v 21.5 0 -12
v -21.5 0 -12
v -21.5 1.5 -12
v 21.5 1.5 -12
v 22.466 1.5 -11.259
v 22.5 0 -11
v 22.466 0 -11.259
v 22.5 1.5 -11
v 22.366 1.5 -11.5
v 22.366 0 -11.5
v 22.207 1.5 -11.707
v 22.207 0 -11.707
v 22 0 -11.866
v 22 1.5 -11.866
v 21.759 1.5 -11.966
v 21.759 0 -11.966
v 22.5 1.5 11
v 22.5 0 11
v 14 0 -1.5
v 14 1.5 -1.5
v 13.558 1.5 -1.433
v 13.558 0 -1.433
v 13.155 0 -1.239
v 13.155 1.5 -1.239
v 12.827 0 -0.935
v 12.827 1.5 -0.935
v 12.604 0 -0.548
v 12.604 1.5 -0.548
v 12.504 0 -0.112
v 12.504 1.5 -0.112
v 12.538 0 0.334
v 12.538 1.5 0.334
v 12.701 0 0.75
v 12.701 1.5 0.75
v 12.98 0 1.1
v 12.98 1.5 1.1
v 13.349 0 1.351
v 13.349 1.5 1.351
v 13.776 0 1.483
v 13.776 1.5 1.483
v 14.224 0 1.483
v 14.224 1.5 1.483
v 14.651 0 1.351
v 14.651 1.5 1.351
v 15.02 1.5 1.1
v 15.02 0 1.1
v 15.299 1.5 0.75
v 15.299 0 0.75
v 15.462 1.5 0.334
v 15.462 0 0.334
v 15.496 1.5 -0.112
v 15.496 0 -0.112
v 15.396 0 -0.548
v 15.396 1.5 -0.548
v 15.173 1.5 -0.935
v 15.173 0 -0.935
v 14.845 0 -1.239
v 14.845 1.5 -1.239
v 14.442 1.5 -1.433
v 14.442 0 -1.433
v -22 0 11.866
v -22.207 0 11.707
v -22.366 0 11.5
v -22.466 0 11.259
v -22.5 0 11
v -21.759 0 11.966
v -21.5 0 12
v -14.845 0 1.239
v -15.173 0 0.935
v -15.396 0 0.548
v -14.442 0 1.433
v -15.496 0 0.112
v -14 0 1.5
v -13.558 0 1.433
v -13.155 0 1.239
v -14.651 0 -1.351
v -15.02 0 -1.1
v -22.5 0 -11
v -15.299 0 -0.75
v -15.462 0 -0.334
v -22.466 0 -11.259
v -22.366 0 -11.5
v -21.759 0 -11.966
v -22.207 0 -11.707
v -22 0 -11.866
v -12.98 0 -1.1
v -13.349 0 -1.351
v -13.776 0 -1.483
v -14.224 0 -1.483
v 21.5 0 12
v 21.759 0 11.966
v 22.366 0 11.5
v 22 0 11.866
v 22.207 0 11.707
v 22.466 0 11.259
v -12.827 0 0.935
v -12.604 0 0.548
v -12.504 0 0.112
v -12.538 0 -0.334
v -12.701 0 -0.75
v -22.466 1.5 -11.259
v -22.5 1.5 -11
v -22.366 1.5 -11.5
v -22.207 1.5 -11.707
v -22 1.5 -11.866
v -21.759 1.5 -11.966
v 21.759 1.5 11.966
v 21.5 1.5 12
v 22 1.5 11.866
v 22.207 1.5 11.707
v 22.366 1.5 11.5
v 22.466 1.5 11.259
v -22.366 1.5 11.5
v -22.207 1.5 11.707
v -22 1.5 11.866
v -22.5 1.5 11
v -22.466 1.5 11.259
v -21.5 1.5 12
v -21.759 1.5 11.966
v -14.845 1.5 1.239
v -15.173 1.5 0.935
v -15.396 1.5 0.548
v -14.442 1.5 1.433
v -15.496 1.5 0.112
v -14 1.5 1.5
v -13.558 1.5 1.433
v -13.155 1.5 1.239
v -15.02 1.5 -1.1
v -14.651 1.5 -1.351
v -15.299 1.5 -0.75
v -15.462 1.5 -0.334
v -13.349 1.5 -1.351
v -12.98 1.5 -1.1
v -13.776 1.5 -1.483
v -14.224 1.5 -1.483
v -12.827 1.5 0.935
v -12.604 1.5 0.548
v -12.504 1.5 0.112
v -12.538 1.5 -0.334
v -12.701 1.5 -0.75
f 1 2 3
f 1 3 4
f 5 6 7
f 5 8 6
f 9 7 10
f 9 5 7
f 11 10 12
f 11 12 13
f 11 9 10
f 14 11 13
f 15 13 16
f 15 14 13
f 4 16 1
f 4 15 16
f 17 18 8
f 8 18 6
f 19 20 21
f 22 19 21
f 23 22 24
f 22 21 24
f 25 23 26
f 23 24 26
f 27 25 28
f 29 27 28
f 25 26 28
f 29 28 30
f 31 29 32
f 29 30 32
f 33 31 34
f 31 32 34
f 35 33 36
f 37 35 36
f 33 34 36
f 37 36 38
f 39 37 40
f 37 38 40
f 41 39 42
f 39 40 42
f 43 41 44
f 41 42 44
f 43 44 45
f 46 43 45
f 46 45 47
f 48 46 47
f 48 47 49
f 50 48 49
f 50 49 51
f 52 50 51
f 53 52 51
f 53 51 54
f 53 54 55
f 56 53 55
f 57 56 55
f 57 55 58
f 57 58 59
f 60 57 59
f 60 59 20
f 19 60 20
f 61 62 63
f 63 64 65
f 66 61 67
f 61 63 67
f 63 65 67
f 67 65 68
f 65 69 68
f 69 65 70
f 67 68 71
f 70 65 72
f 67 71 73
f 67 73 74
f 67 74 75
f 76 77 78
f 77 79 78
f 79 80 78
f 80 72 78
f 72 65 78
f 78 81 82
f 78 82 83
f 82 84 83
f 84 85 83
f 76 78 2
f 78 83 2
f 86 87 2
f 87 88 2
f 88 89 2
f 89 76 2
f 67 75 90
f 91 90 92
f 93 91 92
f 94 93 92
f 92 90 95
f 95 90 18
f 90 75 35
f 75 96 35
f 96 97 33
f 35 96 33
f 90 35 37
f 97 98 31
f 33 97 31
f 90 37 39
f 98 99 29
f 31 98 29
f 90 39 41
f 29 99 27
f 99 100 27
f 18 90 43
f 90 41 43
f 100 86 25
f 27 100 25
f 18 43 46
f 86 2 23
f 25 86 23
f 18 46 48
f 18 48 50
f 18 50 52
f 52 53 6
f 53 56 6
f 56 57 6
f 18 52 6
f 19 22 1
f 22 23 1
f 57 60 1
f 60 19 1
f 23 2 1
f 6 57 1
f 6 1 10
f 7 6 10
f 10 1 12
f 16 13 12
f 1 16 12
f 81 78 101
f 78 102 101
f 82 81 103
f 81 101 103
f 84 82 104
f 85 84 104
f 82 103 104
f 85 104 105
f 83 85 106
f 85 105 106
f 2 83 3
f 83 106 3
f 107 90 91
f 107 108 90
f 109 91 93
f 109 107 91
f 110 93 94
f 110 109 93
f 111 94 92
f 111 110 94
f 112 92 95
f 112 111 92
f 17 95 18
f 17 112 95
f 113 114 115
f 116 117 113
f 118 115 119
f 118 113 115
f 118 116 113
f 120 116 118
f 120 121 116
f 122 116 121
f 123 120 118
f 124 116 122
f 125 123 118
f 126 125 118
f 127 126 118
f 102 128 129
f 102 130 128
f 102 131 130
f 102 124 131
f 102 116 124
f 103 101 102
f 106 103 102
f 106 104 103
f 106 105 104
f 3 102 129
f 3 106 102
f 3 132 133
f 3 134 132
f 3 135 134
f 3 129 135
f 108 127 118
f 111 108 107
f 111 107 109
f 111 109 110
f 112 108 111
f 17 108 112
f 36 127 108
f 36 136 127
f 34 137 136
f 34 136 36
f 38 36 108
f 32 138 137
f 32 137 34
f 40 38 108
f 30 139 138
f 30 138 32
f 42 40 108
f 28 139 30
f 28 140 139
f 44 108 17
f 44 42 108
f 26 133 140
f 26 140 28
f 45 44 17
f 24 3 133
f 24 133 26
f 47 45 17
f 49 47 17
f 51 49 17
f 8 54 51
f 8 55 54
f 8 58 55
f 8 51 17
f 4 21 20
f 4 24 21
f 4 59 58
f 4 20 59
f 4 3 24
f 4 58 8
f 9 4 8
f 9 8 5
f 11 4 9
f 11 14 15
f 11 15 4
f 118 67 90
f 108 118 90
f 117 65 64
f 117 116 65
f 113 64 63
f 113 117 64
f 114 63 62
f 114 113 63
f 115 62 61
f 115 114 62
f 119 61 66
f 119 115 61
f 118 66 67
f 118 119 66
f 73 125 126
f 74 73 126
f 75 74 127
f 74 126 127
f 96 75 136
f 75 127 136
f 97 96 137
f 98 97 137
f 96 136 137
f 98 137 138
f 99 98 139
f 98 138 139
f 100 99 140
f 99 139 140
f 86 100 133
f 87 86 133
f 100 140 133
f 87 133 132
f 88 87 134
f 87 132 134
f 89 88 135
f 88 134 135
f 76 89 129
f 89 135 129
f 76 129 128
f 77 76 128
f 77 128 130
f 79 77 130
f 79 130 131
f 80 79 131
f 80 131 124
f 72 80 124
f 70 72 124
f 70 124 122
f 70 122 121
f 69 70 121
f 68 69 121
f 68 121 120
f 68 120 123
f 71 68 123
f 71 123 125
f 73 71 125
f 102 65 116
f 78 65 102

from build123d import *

# Parameters (mm, degrees)
SKETCH1_W           = 45
SKETCH1_H           = 24
BOSS_EXTRUDE1_DEPTH = 1.5
FILLET1_R           = 1
CUT_EXTRUDE1_REACH  = 27.544
SKETCH2_R           = 1.5


with BuildPart() as part:
    # Sketch1 → Boss-Extrude1 (new body)
    with BuildSketch(Plane(origin=(0, 0, 0), x_dir=(1, 0, 0), z_dir=(0, 1, 0))):
        Rectangle(SKETCH1_W, SKETCH1_H)
    extrude(amount=BOSS_EXTRUDE1_DEPTH)

    # Fillet1
    fillet1_edges = [part.edges().sort_by_distance(p)[0] for p in [
        (22.5, 0.75, 12),
        (-22.5, 0.75, 12),
        (-22.5, 0.75, -12),
        (22.5, 0.75, -12),
    ]]
    fillet(fillet1_edges, radius=FILLET1_R)

    # Sketch2 → Cut-Extrude1 (cut, up to next)
    with BuildSketch(Plane(origin=(0, 1.5, 0), x_dir=(1, 0, 0), z_dir=(0, 1, 0)), mode=Mode.PRIVATE) as cut_extrude1_sk1:
        with Locations(Location((-14, 0, 0), (0, 0, 270))):
            Circle(SKETCH2_R)
    cut_extrude1_tool1 = extrude(cut_extrude1_sk1.sketch, amount=-CUT_EXTRUDE1_REACH, mode=Mode.PRIVATE) & part.part
    # Sketch2 → Cut-Extrude1 (cut, up to next)
    with BuildSketch(Plane(origin=(0, 1.5, 0), x_dir=(1, 0, 0), z_dir=(0, 1, 0)), mode=Mode.PRIVATE) as cut_extrude1_sk2:
        with Locations(Location((14, 0, 0), (0, 0, 90))):
            Circle(SKETCH2_R)
    cut_extrude1_tool2 = extrude(cut_extrude1_sk2.sketch, amount=-CUT_EXTRUDE1_REACH, mode=Mode.PRIVATE) & part.part
    add(cut_extrude1_tool1.solids().sort_by_distance((-14, 1.5, 0))[0], mode=Mode.SUBTRACT)
    add(cut_extrude1_tool2.solids().sort_by_distance((14, 1.5, 0))[0], mode=Mode.SUBTRACT)


solid = part.part
